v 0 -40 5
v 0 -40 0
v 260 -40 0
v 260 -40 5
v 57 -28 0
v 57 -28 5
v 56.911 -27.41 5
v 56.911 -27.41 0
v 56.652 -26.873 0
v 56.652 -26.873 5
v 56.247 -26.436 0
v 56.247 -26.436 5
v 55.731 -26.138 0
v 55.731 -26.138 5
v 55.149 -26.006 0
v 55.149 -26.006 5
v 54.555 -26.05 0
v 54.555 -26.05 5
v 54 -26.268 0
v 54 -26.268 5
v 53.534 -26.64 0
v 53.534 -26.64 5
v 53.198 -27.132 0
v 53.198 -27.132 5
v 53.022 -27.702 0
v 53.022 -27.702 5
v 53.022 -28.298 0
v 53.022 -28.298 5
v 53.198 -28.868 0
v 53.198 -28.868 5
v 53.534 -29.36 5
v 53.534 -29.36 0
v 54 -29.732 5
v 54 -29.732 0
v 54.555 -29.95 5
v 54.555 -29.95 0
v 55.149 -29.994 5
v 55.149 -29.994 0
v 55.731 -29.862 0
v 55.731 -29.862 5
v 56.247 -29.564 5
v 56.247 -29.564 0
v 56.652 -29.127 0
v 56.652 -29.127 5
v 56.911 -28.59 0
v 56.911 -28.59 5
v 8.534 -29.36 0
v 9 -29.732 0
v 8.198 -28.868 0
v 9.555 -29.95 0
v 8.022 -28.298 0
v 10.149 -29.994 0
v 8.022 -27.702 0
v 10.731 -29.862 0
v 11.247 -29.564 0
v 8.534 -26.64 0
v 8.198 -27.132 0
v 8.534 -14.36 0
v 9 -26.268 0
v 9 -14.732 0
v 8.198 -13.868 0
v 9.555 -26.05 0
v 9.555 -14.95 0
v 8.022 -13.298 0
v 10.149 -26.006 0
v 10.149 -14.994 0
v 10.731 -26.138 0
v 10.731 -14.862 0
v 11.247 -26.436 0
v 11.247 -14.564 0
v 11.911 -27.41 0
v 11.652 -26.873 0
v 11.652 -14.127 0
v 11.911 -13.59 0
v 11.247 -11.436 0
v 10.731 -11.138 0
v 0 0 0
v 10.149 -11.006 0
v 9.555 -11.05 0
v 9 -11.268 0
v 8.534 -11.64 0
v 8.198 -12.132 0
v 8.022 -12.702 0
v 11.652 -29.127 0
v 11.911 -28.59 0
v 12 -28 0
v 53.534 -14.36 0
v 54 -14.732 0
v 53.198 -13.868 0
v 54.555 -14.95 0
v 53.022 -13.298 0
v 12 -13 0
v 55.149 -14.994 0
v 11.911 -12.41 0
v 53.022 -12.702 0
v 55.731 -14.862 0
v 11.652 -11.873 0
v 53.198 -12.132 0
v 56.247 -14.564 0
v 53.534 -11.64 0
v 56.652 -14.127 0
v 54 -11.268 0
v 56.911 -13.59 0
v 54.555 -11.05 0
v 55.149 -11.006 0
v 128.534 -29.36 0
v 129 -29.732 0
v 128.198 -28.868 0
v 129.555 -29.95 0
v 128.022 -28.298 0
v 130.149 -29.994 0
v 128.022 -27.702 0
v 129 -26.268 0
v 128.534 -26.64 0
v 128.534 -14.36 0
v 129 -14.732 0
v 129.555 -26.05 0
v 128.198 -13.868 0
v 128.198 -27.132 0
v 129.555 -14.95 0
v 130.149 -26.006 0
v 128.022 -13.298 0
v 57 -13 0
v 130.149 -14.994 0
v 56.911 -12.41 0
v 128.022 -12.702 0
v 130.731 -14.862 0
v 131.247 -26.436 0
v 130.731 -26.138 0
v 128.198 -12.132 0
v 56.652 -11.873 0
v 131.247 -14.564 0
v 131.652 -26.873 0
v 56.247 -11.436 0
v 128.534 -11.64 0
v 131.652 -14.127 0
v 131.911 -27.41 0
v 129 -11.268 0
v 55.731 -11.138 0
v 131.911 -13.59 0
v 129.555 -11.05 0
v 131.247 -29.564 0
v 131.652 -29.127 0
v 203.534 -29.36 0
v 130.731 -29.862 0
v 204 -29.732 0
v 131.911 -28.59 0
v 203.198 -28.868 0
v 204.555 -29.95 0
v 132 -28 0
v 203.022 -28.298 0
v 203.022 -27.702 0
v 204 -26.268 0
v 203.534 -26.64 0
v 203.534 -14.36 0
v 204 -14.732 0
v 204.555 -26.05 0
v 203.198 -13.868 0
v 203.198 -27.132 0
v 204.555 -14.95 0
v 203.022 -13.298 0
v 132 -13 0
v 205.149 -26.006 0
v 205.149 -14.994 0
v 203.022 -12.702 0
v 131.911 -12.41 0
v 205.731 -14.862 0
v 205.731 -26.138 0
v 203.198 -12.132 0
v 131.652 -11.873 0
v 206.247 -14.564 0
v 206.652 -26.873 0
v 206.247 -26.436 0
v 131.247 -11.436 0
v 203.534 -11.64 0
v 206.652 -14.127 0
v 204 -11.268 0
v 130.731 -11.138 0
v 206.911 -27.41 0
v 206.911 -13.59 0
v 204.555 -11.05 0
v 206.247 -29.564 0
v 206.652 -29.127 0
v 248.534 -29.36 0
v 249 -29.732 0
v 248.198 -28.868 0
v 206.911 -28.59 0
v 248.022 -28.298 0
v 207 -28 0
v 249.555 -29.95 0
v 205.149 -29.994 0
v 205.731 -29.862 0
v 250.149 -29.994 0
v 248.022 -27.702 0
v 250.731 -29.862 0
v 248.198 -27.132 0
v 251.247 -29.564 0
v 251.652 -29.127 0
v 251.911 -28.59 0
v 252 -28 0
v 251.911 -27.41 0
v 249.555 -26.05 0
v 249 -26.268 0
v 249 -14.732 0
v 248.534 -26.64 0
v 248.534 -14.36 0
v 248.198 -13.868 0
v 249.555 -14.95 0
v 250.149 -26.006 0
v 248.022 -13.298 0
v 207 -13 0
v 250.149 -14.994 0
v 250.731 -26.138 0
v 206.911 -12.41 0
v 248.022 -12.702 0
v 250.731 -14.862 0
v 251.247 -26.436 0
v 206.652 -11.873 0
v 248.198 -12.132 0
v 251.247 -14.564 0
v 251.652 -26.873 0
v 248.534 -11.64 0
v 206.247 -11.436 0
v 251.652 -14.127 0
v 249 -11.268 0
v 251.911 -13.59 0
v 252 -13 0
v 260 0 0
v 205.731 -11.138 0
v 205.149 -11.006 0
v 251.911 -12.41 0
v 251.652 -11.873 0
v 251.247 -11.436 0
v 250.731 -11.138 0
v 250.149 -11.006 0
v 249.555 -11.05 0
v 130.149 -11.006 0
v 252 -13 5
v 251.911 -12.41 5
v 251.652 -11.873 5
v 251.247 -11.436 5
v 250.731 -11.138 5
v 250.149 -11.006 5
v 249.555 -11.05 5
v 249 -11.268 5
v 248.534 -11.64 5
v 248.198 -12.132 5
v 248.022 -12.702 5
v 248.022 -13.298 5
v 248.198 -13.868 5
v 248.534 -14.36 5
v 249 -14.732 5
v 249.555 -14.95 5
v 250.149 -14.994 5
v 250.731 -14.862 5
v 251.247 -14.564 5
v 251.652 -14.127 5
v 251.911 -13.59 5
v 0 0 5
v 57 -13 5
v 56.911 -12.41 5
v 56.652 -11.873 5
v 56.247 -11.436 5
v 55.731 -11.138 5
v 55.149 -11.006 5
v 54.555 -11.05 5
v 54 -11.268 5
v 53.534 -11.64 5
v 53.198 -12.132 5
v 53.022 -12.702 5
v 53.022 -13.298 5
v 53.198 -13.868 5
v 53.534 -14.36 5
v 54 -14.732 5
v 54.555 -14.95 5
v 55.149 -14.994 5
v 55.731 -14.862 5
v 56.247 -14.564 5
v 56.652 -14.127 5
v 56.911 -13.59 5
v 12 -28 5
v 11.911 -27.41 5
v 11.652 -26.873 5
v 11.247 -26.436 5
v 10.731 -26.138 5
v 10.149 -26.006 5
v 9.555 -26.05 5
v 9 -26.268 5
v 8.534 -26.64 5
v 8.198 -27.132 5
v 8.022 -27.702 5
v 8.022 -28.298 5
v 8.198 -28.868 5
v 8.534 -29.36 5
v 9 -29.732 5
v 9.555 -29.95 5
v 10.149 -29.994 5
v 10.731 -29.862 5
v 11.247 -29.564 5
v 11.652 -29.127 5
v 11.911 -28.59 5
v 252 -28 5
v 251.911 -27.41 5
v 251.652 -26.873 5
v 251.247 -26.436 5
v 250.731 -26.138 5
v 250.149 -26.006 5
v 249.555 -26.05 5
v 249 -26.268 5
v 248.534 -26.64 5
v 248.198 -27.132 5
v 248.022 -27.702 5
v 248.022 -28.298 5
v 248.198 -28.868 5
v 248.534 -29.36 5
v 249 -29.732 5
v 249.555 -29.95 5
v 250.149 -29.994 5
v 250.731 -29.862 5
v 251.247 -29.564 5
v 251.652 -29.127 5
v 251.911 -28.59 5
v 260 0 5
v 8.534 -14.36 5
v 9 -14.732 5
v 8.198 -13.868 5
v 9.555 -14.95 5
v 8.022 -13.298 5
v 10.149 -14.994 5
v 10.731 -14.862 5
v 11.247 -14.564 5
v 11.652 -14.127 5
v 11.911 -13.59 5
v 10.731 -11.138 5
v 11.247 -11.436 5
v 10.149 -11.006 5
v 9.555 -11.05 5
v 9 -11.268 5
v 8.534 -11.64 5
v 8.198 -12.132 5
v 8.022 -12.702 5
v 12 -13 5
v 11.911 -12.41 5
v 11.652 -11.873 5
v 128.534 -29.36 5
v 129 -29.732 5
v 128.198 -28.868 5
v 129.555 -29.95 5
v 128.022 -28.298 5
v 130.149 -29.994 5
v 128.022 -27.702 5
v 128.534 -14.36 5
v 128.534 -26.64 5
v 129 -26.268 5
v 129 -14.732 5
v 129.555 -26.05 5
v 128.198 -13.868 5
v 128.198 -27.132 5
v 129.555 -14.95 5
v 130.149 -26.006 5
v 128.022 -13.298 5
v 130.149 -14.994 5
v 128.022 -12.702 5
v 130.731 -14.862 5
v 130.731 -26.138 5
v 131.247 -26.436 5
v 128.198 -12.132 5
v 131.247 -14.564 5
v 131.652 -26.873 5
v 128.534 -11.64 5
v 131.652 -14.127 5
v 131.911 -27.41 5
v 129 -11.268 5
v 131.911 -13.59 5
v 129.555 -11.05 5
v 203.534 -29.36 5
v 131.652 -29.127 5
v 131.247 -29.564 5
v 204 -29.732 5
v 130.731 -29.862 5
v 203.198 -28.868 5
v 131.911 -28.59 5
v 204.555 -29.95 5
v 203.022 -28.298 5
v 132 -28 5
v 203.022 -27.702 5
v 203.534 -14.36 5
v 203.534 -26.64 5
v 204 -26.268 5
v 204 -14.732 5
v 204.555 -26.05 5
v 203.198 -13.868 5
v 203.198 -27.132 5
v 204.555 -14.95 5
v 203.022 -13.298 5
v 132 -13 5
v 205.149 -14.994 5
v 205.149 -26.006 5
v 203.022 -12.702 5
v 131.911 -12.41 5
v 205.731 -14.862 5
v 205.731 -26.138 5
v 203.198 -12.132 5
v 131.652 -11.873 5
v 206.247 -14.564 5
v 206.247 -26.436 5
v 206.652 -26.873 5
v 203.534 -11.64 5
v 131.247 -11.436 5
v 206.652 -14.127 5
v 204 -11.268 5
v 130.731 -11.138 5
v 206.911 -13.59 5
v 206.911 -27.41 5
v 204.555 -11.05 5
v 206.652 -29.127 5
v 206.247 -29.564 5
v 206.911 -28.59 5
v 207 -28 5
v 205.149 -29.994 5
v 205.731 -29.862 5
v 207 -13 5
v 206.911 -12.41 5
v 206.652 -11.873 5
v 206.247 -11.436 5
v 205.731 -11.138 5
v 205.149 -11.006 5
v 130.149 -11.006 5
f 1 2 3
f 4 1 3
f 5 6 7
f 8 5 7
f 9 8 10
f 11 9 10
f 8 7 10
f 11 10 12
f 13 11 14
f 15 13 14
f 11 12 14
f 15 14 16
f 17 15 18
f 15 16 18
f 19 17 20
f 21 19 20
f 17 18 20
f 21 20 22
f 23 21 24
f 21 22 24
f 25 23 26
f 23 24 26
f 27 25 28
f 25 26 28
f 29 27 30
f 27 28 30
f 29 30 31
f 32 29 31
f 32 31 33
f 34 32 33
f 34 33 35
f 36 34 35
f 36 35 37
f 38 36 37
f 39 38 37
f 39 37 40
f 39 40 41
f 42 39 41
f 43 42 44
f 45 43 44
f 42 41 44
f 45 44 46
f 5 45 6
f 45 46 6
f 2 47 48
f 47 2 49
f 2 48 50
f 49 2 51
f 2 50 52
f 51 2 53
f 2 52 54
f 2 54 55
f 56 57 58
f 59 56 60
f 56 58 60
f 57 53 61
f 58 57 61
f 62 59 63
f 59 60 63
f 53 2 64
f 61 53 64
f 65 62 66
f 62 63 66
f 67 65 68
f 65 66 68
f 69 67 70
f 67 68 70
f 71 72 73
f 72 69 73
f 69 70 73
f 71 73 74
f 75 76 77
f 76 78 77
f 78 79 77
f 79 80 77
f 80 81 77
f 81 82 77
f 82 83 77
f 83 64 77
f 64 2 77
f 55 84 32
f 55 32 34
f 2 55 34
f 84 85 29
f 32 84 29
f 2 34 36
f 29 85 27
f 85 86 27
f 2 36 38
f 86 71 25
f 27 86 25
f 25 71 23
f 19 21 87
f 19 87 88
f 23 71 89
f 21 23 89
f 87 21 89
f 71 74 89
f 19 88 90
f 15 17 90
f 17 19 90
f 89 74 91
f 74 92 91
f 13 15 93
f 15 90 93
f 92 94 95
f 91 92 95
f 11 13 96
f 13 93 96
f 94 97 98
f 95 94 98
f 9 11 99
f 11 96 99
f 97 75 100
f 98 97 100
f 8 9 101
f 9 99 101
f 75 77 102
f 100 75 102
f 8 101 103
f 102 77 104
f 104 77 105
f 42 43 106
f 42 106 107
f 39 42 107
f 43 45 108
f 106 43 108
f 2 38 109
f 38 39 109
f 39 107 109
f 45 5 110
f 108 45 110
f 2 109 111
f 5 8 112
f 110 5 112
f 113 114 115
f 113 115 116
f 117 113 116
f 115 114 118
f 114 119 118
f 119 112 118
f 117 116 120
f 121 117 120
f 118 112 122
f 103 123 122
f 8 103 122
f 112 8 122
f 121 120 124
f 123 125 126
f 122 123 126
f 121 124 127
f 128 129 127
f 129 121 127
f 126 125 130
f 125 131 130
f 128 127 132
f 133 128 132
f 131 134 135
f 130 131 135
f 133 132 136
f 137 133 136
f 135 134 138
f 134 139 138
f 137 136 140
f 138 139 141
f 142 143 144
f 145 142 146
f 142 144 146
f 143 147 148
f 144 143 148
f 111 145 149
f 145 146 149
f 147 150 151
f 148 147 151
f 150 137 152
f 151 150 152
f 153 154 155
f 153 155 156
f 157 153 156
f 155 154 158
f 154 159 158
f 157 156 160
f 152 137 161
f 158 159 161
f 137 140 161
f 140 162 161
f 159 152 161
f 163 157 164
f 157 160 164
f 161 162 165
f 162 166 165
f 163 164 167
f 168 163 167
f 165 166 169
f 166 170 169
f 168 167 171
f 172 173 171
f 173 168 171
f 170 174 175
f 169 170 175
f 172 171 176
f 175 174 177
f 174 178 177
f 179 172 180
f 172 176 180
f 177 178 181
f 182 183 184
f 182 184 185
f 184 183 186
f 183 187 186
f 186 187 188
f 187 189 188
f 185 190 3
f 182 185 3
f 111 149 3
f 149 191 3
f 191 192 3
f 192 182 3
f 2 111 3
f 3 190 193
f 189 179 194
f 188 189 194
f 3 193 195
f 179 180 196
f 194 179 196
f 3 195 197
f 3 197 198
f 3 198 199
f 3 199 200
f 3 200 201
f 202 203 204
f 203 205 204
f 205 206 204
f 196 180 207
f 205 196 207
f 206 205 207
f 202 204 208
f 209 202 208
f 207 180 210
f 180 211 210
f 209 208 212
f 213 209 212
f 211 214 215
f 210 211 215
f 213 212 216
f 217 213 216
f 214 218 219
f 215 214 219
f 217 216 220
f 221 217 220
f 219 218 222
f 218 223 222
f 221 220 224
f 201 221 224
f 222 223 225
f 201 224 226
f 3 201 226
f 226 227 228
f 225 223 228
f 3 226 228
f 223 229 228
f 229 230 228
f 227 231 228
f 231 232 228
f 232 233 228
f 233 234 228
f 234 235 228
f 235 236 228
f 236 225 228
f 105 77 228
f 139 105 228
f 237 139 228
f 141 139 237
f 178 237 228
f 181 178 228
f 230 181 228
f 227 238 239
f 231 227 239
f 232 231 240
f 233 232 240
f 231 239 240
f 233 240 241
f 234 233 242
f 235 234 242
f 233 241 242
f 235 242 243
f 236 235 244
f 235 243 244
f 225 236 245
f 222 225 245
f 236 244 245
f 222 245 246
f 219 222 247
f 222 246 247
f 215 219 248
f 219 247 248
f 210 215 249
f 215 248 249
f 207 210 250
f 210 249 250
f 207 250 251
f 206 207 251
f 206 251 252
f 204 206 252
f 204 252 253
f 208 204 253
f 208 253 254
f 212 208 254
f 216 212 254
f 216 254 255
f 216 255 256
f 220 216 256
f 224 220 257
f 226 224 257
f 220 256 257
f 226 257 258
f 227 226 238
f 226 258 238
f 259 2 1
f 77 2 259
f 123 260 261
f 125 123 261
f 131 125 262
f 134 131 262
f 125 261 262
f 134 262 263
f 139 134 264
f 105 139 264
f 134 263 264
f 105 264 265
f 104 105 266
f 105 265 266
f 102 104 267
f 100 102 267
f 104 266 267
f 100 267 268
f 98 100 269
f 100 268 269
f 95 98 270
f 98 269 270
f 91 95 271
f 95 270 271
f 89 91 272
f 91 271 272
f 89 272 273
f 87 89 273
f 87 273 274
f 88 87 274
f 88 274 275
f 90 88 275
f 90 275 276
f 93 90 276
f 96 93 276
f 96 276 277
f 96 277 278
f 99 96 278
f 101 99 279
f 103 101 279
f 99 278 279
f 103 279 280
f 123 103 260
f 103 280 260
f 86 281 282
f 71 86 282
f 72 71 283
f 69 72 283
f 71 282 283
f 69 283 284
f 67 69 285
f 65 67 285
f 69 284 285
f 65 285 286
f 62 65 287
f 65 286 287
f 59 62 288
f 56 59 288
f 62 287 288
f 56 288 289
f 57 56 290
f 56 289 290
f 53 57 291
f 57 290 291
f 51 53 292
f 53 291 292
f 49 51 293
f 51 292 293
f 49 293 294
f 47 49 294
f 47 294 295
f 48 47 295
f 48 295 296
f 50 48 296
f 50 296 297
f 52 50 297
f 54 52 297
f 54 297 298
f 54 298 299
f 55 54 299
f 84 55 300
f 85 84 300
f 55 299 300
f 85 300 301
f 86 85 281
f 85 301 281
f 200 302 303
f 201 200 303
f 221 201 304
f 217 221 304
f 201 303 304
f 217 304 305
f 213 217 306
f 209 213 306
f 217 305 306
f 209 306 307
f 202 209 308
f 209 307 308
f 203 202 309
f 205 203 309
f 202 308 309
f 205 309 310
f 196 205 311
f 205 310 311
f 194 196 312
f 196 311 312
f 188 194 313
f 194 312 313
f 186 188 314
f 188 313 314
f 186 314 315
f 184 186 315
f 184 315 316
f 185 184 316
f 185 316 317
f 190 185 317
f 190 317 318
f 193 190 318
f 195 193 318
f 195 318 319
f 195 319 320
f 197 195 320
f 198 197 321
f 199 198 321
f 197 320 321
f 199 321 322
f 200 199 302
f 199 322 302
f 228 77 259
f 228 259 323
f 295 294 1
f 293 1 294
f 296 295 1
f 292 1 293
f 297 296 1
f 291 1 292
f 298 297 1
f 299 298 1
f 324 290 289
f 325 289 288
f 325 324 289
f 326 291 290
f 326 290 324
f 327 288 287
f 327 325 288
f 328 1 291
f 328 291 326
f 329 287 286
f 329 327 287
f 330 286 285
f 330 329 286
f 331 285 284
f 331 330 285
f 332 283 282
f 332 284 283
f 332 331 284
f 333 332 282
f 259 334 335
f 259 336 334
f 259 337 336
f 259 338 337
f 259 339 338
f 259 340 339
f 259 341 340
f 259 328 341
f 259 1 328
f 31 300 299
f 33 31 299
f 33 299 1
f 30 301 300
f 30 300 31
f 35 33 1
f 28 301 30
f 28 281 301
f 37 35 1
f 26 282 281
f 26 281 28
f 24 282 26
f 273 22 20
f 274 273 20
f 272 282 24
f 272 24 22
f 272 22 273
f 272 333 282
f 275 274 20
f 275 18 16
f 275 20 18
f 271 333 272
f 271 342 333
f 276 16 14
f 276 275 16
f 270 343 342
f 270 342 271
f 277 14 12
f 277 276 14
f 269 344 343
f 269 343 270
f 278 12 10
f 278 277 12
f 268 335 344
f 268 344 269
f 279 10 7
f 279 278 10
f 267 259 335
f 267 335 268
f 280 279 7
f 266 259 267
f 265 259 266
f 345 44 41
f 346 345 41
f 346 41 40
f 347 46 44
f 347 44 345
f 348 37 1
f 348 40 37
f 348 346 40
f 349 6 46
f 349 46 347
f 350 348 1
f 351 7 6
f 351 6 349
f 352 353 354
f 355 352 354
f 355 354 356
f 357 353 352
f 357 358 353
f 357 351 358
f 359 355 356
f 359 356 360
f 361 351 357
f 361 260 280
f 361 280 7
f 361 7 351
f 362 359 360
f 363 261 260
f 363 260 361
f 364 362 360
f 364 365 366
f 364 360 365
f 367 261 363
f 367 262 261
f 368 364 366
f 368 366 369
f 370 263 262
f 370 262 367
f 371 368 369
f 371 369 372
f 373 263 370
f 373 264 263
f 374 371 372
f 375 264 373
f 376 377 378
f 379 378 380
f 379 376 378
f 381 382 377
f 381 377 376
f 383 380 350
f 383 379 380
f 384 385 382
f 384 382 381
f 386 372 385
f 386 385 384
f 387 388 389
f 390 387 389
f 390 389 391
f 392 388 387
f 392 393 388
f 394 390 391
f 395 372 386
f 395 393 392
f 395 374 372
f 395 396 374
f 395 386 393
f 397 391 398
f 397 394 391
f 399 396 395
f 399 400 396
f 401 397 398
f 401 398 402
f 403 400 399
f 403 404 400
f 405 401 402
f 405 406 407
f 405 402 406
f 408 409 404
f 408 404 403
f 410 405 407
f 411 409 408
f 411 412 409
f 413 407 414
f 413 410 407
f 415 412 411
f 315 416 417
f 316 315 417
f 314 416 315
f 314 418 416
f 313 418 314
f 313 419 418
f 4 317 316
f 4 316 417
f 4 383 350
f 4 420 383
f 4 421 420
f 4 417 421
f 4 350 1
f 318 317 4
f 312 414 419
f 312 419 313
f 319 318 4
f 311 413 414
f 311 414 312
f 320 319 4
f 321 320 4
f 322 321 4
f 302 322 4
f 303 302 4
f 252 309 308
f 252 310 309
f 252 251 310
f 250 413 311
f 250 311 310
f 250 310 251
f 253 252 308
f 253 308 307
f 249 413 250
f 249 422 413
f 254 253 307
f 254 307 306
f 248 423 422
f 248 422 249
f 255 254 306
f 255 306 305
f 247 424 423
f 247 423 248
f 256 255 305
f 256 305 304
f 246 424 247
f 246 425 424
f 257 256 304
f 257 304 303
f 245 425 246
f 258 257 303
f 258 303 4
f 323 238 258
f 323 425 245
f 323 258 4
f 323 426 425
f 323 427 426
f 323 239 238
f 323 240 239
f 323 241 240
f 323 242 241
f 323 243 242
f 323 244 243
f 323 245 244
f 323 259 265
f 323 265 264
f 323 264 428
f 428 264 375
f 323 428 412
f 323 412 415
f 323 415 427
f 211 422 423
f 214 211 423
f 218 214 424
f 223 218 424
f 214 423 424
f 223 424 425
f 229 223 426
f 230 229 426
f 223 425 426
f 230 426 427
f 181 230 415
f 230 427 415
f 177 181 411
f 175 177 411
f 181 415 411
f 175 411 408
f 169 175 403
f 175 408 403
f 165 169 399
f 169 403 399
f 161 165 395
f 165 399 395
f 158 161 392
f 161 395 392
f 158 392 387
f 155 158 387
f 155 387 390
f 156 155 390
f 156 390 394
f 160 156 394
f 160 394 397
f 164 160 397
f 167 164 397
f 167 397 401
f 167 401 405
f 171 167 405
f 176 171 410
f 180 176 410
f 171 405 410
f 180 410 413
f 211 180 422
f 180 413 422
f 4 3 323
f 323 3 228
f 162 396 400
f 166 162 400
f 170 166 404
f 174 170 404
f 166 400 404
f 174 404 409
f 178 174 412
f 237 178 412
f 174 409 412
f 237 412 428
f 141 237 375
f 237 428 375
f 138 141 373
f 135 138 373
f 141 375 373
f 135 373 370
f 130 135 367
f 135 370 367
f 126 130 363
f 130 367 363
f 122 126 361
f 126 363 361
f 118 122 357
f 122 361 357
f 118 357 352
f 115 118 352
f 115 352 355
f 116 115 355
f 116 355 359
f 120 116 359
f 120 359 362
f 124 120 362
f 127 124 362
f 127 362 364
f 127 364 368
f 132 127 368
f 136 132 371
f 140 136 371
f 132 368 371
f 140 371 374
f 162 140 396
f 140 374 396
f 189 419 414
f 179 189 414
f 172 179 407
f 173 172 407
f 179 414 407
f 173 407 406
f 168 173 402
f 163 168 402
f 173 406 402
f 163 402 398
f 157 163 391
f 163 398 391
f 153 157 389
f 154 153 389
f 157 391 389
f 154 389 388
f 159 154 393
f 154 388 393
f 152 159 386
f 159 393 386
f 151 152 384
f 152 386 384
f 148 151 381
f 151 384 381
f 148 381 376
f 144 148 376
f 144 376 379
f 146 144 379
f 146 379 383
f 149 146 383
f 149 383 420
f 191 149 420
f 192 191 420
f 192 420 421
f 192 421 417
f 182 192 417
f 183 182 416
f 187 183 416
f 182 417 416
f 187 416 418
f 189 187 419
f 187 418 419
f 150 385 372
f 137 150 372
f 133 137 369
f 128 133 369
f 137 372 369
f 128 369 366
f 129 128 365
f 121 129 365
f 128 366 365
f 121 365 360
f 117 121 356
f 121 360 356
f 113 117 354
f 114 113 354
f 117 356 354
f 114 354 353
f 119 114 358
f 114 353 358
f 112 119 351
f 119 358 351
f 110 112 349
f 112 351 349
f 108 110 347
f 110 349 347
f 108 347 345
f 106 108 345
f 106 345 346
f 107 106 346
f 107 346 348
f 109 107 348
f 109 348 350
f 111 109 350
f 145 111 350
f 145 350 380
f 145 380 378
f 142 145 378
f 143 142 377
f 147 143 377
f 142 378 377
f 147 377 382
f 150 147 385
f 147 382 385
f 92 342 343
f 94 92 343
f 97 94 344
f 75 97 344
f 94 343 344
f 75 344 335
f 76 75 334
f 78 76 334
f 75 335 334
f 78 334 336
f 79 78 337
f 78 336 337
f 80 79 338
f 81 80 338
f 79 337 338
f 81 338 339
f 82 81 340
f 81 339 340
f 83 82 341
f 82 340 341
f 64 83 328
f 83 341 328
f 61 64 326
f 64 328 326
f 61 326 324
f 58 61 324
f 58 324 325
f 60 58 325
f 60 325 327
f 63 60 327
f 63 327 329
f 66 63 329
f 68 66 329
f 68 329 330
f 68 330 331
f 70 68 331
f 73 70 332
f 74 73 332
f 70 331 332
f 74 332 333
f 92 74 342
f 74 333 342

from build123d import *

# Parameters (mm, degrees)
ESQUISSE1_W             = 260
ESQUISSE1_H             = 40
BOSS_EXTRU_1_DEPTH      = 5
ESQUISSE2_R             = 2
ENL_V_MAT_EXTRU_1_DEPTH = 5


with BuildPart() as part:
    # Esquisse1 → Boss.-Extru.1 (new body)
    with BuildSketch(Plane.XY):
        with Locations((130, -20)):
            Rectangle(ESQUISSE1_W, ESQUISSE1_H)
    extrude(amount=BOSS_EXTRU_1_DEPTH)

    # Esquisse2 → Enlèv. mat.-Extru.1 (cut)
    with BuildSketch(Plane.XY.offset(5)):
        with Locations((10, -13)):
            Circle(ESQUISSE2_R)
        with Locations((10, -28)):
            Circle(ESQUISSE2_R)
        with Locations((250, -28)):
            Circle(ESQUISSE2_R)
        with Locations((250, -13)):
            Circle(ESQUISSE2_R)
        with Locations((205, -28)):
            Circle(ESQUISSE2_R)
        with Locations((205, -13)):
            Circle(ESQUISSE2_R)
        with Locations((55, -13)):
            Circle(ESQUISSE2_R)
        with Locations((55, -28)):
            Circle(ESQUISSE2_R)
        with Locations((130, -13)):
            Circle(ESQUISSE2_R)
        with Locations((130, -28)):
            Circle(ESQUISSE2_R)
    extrude(amount=-ENL_V_MAT_EXTRU_1_DEPTH, mode=Mode.SUBTRACT)


solid = part.part
